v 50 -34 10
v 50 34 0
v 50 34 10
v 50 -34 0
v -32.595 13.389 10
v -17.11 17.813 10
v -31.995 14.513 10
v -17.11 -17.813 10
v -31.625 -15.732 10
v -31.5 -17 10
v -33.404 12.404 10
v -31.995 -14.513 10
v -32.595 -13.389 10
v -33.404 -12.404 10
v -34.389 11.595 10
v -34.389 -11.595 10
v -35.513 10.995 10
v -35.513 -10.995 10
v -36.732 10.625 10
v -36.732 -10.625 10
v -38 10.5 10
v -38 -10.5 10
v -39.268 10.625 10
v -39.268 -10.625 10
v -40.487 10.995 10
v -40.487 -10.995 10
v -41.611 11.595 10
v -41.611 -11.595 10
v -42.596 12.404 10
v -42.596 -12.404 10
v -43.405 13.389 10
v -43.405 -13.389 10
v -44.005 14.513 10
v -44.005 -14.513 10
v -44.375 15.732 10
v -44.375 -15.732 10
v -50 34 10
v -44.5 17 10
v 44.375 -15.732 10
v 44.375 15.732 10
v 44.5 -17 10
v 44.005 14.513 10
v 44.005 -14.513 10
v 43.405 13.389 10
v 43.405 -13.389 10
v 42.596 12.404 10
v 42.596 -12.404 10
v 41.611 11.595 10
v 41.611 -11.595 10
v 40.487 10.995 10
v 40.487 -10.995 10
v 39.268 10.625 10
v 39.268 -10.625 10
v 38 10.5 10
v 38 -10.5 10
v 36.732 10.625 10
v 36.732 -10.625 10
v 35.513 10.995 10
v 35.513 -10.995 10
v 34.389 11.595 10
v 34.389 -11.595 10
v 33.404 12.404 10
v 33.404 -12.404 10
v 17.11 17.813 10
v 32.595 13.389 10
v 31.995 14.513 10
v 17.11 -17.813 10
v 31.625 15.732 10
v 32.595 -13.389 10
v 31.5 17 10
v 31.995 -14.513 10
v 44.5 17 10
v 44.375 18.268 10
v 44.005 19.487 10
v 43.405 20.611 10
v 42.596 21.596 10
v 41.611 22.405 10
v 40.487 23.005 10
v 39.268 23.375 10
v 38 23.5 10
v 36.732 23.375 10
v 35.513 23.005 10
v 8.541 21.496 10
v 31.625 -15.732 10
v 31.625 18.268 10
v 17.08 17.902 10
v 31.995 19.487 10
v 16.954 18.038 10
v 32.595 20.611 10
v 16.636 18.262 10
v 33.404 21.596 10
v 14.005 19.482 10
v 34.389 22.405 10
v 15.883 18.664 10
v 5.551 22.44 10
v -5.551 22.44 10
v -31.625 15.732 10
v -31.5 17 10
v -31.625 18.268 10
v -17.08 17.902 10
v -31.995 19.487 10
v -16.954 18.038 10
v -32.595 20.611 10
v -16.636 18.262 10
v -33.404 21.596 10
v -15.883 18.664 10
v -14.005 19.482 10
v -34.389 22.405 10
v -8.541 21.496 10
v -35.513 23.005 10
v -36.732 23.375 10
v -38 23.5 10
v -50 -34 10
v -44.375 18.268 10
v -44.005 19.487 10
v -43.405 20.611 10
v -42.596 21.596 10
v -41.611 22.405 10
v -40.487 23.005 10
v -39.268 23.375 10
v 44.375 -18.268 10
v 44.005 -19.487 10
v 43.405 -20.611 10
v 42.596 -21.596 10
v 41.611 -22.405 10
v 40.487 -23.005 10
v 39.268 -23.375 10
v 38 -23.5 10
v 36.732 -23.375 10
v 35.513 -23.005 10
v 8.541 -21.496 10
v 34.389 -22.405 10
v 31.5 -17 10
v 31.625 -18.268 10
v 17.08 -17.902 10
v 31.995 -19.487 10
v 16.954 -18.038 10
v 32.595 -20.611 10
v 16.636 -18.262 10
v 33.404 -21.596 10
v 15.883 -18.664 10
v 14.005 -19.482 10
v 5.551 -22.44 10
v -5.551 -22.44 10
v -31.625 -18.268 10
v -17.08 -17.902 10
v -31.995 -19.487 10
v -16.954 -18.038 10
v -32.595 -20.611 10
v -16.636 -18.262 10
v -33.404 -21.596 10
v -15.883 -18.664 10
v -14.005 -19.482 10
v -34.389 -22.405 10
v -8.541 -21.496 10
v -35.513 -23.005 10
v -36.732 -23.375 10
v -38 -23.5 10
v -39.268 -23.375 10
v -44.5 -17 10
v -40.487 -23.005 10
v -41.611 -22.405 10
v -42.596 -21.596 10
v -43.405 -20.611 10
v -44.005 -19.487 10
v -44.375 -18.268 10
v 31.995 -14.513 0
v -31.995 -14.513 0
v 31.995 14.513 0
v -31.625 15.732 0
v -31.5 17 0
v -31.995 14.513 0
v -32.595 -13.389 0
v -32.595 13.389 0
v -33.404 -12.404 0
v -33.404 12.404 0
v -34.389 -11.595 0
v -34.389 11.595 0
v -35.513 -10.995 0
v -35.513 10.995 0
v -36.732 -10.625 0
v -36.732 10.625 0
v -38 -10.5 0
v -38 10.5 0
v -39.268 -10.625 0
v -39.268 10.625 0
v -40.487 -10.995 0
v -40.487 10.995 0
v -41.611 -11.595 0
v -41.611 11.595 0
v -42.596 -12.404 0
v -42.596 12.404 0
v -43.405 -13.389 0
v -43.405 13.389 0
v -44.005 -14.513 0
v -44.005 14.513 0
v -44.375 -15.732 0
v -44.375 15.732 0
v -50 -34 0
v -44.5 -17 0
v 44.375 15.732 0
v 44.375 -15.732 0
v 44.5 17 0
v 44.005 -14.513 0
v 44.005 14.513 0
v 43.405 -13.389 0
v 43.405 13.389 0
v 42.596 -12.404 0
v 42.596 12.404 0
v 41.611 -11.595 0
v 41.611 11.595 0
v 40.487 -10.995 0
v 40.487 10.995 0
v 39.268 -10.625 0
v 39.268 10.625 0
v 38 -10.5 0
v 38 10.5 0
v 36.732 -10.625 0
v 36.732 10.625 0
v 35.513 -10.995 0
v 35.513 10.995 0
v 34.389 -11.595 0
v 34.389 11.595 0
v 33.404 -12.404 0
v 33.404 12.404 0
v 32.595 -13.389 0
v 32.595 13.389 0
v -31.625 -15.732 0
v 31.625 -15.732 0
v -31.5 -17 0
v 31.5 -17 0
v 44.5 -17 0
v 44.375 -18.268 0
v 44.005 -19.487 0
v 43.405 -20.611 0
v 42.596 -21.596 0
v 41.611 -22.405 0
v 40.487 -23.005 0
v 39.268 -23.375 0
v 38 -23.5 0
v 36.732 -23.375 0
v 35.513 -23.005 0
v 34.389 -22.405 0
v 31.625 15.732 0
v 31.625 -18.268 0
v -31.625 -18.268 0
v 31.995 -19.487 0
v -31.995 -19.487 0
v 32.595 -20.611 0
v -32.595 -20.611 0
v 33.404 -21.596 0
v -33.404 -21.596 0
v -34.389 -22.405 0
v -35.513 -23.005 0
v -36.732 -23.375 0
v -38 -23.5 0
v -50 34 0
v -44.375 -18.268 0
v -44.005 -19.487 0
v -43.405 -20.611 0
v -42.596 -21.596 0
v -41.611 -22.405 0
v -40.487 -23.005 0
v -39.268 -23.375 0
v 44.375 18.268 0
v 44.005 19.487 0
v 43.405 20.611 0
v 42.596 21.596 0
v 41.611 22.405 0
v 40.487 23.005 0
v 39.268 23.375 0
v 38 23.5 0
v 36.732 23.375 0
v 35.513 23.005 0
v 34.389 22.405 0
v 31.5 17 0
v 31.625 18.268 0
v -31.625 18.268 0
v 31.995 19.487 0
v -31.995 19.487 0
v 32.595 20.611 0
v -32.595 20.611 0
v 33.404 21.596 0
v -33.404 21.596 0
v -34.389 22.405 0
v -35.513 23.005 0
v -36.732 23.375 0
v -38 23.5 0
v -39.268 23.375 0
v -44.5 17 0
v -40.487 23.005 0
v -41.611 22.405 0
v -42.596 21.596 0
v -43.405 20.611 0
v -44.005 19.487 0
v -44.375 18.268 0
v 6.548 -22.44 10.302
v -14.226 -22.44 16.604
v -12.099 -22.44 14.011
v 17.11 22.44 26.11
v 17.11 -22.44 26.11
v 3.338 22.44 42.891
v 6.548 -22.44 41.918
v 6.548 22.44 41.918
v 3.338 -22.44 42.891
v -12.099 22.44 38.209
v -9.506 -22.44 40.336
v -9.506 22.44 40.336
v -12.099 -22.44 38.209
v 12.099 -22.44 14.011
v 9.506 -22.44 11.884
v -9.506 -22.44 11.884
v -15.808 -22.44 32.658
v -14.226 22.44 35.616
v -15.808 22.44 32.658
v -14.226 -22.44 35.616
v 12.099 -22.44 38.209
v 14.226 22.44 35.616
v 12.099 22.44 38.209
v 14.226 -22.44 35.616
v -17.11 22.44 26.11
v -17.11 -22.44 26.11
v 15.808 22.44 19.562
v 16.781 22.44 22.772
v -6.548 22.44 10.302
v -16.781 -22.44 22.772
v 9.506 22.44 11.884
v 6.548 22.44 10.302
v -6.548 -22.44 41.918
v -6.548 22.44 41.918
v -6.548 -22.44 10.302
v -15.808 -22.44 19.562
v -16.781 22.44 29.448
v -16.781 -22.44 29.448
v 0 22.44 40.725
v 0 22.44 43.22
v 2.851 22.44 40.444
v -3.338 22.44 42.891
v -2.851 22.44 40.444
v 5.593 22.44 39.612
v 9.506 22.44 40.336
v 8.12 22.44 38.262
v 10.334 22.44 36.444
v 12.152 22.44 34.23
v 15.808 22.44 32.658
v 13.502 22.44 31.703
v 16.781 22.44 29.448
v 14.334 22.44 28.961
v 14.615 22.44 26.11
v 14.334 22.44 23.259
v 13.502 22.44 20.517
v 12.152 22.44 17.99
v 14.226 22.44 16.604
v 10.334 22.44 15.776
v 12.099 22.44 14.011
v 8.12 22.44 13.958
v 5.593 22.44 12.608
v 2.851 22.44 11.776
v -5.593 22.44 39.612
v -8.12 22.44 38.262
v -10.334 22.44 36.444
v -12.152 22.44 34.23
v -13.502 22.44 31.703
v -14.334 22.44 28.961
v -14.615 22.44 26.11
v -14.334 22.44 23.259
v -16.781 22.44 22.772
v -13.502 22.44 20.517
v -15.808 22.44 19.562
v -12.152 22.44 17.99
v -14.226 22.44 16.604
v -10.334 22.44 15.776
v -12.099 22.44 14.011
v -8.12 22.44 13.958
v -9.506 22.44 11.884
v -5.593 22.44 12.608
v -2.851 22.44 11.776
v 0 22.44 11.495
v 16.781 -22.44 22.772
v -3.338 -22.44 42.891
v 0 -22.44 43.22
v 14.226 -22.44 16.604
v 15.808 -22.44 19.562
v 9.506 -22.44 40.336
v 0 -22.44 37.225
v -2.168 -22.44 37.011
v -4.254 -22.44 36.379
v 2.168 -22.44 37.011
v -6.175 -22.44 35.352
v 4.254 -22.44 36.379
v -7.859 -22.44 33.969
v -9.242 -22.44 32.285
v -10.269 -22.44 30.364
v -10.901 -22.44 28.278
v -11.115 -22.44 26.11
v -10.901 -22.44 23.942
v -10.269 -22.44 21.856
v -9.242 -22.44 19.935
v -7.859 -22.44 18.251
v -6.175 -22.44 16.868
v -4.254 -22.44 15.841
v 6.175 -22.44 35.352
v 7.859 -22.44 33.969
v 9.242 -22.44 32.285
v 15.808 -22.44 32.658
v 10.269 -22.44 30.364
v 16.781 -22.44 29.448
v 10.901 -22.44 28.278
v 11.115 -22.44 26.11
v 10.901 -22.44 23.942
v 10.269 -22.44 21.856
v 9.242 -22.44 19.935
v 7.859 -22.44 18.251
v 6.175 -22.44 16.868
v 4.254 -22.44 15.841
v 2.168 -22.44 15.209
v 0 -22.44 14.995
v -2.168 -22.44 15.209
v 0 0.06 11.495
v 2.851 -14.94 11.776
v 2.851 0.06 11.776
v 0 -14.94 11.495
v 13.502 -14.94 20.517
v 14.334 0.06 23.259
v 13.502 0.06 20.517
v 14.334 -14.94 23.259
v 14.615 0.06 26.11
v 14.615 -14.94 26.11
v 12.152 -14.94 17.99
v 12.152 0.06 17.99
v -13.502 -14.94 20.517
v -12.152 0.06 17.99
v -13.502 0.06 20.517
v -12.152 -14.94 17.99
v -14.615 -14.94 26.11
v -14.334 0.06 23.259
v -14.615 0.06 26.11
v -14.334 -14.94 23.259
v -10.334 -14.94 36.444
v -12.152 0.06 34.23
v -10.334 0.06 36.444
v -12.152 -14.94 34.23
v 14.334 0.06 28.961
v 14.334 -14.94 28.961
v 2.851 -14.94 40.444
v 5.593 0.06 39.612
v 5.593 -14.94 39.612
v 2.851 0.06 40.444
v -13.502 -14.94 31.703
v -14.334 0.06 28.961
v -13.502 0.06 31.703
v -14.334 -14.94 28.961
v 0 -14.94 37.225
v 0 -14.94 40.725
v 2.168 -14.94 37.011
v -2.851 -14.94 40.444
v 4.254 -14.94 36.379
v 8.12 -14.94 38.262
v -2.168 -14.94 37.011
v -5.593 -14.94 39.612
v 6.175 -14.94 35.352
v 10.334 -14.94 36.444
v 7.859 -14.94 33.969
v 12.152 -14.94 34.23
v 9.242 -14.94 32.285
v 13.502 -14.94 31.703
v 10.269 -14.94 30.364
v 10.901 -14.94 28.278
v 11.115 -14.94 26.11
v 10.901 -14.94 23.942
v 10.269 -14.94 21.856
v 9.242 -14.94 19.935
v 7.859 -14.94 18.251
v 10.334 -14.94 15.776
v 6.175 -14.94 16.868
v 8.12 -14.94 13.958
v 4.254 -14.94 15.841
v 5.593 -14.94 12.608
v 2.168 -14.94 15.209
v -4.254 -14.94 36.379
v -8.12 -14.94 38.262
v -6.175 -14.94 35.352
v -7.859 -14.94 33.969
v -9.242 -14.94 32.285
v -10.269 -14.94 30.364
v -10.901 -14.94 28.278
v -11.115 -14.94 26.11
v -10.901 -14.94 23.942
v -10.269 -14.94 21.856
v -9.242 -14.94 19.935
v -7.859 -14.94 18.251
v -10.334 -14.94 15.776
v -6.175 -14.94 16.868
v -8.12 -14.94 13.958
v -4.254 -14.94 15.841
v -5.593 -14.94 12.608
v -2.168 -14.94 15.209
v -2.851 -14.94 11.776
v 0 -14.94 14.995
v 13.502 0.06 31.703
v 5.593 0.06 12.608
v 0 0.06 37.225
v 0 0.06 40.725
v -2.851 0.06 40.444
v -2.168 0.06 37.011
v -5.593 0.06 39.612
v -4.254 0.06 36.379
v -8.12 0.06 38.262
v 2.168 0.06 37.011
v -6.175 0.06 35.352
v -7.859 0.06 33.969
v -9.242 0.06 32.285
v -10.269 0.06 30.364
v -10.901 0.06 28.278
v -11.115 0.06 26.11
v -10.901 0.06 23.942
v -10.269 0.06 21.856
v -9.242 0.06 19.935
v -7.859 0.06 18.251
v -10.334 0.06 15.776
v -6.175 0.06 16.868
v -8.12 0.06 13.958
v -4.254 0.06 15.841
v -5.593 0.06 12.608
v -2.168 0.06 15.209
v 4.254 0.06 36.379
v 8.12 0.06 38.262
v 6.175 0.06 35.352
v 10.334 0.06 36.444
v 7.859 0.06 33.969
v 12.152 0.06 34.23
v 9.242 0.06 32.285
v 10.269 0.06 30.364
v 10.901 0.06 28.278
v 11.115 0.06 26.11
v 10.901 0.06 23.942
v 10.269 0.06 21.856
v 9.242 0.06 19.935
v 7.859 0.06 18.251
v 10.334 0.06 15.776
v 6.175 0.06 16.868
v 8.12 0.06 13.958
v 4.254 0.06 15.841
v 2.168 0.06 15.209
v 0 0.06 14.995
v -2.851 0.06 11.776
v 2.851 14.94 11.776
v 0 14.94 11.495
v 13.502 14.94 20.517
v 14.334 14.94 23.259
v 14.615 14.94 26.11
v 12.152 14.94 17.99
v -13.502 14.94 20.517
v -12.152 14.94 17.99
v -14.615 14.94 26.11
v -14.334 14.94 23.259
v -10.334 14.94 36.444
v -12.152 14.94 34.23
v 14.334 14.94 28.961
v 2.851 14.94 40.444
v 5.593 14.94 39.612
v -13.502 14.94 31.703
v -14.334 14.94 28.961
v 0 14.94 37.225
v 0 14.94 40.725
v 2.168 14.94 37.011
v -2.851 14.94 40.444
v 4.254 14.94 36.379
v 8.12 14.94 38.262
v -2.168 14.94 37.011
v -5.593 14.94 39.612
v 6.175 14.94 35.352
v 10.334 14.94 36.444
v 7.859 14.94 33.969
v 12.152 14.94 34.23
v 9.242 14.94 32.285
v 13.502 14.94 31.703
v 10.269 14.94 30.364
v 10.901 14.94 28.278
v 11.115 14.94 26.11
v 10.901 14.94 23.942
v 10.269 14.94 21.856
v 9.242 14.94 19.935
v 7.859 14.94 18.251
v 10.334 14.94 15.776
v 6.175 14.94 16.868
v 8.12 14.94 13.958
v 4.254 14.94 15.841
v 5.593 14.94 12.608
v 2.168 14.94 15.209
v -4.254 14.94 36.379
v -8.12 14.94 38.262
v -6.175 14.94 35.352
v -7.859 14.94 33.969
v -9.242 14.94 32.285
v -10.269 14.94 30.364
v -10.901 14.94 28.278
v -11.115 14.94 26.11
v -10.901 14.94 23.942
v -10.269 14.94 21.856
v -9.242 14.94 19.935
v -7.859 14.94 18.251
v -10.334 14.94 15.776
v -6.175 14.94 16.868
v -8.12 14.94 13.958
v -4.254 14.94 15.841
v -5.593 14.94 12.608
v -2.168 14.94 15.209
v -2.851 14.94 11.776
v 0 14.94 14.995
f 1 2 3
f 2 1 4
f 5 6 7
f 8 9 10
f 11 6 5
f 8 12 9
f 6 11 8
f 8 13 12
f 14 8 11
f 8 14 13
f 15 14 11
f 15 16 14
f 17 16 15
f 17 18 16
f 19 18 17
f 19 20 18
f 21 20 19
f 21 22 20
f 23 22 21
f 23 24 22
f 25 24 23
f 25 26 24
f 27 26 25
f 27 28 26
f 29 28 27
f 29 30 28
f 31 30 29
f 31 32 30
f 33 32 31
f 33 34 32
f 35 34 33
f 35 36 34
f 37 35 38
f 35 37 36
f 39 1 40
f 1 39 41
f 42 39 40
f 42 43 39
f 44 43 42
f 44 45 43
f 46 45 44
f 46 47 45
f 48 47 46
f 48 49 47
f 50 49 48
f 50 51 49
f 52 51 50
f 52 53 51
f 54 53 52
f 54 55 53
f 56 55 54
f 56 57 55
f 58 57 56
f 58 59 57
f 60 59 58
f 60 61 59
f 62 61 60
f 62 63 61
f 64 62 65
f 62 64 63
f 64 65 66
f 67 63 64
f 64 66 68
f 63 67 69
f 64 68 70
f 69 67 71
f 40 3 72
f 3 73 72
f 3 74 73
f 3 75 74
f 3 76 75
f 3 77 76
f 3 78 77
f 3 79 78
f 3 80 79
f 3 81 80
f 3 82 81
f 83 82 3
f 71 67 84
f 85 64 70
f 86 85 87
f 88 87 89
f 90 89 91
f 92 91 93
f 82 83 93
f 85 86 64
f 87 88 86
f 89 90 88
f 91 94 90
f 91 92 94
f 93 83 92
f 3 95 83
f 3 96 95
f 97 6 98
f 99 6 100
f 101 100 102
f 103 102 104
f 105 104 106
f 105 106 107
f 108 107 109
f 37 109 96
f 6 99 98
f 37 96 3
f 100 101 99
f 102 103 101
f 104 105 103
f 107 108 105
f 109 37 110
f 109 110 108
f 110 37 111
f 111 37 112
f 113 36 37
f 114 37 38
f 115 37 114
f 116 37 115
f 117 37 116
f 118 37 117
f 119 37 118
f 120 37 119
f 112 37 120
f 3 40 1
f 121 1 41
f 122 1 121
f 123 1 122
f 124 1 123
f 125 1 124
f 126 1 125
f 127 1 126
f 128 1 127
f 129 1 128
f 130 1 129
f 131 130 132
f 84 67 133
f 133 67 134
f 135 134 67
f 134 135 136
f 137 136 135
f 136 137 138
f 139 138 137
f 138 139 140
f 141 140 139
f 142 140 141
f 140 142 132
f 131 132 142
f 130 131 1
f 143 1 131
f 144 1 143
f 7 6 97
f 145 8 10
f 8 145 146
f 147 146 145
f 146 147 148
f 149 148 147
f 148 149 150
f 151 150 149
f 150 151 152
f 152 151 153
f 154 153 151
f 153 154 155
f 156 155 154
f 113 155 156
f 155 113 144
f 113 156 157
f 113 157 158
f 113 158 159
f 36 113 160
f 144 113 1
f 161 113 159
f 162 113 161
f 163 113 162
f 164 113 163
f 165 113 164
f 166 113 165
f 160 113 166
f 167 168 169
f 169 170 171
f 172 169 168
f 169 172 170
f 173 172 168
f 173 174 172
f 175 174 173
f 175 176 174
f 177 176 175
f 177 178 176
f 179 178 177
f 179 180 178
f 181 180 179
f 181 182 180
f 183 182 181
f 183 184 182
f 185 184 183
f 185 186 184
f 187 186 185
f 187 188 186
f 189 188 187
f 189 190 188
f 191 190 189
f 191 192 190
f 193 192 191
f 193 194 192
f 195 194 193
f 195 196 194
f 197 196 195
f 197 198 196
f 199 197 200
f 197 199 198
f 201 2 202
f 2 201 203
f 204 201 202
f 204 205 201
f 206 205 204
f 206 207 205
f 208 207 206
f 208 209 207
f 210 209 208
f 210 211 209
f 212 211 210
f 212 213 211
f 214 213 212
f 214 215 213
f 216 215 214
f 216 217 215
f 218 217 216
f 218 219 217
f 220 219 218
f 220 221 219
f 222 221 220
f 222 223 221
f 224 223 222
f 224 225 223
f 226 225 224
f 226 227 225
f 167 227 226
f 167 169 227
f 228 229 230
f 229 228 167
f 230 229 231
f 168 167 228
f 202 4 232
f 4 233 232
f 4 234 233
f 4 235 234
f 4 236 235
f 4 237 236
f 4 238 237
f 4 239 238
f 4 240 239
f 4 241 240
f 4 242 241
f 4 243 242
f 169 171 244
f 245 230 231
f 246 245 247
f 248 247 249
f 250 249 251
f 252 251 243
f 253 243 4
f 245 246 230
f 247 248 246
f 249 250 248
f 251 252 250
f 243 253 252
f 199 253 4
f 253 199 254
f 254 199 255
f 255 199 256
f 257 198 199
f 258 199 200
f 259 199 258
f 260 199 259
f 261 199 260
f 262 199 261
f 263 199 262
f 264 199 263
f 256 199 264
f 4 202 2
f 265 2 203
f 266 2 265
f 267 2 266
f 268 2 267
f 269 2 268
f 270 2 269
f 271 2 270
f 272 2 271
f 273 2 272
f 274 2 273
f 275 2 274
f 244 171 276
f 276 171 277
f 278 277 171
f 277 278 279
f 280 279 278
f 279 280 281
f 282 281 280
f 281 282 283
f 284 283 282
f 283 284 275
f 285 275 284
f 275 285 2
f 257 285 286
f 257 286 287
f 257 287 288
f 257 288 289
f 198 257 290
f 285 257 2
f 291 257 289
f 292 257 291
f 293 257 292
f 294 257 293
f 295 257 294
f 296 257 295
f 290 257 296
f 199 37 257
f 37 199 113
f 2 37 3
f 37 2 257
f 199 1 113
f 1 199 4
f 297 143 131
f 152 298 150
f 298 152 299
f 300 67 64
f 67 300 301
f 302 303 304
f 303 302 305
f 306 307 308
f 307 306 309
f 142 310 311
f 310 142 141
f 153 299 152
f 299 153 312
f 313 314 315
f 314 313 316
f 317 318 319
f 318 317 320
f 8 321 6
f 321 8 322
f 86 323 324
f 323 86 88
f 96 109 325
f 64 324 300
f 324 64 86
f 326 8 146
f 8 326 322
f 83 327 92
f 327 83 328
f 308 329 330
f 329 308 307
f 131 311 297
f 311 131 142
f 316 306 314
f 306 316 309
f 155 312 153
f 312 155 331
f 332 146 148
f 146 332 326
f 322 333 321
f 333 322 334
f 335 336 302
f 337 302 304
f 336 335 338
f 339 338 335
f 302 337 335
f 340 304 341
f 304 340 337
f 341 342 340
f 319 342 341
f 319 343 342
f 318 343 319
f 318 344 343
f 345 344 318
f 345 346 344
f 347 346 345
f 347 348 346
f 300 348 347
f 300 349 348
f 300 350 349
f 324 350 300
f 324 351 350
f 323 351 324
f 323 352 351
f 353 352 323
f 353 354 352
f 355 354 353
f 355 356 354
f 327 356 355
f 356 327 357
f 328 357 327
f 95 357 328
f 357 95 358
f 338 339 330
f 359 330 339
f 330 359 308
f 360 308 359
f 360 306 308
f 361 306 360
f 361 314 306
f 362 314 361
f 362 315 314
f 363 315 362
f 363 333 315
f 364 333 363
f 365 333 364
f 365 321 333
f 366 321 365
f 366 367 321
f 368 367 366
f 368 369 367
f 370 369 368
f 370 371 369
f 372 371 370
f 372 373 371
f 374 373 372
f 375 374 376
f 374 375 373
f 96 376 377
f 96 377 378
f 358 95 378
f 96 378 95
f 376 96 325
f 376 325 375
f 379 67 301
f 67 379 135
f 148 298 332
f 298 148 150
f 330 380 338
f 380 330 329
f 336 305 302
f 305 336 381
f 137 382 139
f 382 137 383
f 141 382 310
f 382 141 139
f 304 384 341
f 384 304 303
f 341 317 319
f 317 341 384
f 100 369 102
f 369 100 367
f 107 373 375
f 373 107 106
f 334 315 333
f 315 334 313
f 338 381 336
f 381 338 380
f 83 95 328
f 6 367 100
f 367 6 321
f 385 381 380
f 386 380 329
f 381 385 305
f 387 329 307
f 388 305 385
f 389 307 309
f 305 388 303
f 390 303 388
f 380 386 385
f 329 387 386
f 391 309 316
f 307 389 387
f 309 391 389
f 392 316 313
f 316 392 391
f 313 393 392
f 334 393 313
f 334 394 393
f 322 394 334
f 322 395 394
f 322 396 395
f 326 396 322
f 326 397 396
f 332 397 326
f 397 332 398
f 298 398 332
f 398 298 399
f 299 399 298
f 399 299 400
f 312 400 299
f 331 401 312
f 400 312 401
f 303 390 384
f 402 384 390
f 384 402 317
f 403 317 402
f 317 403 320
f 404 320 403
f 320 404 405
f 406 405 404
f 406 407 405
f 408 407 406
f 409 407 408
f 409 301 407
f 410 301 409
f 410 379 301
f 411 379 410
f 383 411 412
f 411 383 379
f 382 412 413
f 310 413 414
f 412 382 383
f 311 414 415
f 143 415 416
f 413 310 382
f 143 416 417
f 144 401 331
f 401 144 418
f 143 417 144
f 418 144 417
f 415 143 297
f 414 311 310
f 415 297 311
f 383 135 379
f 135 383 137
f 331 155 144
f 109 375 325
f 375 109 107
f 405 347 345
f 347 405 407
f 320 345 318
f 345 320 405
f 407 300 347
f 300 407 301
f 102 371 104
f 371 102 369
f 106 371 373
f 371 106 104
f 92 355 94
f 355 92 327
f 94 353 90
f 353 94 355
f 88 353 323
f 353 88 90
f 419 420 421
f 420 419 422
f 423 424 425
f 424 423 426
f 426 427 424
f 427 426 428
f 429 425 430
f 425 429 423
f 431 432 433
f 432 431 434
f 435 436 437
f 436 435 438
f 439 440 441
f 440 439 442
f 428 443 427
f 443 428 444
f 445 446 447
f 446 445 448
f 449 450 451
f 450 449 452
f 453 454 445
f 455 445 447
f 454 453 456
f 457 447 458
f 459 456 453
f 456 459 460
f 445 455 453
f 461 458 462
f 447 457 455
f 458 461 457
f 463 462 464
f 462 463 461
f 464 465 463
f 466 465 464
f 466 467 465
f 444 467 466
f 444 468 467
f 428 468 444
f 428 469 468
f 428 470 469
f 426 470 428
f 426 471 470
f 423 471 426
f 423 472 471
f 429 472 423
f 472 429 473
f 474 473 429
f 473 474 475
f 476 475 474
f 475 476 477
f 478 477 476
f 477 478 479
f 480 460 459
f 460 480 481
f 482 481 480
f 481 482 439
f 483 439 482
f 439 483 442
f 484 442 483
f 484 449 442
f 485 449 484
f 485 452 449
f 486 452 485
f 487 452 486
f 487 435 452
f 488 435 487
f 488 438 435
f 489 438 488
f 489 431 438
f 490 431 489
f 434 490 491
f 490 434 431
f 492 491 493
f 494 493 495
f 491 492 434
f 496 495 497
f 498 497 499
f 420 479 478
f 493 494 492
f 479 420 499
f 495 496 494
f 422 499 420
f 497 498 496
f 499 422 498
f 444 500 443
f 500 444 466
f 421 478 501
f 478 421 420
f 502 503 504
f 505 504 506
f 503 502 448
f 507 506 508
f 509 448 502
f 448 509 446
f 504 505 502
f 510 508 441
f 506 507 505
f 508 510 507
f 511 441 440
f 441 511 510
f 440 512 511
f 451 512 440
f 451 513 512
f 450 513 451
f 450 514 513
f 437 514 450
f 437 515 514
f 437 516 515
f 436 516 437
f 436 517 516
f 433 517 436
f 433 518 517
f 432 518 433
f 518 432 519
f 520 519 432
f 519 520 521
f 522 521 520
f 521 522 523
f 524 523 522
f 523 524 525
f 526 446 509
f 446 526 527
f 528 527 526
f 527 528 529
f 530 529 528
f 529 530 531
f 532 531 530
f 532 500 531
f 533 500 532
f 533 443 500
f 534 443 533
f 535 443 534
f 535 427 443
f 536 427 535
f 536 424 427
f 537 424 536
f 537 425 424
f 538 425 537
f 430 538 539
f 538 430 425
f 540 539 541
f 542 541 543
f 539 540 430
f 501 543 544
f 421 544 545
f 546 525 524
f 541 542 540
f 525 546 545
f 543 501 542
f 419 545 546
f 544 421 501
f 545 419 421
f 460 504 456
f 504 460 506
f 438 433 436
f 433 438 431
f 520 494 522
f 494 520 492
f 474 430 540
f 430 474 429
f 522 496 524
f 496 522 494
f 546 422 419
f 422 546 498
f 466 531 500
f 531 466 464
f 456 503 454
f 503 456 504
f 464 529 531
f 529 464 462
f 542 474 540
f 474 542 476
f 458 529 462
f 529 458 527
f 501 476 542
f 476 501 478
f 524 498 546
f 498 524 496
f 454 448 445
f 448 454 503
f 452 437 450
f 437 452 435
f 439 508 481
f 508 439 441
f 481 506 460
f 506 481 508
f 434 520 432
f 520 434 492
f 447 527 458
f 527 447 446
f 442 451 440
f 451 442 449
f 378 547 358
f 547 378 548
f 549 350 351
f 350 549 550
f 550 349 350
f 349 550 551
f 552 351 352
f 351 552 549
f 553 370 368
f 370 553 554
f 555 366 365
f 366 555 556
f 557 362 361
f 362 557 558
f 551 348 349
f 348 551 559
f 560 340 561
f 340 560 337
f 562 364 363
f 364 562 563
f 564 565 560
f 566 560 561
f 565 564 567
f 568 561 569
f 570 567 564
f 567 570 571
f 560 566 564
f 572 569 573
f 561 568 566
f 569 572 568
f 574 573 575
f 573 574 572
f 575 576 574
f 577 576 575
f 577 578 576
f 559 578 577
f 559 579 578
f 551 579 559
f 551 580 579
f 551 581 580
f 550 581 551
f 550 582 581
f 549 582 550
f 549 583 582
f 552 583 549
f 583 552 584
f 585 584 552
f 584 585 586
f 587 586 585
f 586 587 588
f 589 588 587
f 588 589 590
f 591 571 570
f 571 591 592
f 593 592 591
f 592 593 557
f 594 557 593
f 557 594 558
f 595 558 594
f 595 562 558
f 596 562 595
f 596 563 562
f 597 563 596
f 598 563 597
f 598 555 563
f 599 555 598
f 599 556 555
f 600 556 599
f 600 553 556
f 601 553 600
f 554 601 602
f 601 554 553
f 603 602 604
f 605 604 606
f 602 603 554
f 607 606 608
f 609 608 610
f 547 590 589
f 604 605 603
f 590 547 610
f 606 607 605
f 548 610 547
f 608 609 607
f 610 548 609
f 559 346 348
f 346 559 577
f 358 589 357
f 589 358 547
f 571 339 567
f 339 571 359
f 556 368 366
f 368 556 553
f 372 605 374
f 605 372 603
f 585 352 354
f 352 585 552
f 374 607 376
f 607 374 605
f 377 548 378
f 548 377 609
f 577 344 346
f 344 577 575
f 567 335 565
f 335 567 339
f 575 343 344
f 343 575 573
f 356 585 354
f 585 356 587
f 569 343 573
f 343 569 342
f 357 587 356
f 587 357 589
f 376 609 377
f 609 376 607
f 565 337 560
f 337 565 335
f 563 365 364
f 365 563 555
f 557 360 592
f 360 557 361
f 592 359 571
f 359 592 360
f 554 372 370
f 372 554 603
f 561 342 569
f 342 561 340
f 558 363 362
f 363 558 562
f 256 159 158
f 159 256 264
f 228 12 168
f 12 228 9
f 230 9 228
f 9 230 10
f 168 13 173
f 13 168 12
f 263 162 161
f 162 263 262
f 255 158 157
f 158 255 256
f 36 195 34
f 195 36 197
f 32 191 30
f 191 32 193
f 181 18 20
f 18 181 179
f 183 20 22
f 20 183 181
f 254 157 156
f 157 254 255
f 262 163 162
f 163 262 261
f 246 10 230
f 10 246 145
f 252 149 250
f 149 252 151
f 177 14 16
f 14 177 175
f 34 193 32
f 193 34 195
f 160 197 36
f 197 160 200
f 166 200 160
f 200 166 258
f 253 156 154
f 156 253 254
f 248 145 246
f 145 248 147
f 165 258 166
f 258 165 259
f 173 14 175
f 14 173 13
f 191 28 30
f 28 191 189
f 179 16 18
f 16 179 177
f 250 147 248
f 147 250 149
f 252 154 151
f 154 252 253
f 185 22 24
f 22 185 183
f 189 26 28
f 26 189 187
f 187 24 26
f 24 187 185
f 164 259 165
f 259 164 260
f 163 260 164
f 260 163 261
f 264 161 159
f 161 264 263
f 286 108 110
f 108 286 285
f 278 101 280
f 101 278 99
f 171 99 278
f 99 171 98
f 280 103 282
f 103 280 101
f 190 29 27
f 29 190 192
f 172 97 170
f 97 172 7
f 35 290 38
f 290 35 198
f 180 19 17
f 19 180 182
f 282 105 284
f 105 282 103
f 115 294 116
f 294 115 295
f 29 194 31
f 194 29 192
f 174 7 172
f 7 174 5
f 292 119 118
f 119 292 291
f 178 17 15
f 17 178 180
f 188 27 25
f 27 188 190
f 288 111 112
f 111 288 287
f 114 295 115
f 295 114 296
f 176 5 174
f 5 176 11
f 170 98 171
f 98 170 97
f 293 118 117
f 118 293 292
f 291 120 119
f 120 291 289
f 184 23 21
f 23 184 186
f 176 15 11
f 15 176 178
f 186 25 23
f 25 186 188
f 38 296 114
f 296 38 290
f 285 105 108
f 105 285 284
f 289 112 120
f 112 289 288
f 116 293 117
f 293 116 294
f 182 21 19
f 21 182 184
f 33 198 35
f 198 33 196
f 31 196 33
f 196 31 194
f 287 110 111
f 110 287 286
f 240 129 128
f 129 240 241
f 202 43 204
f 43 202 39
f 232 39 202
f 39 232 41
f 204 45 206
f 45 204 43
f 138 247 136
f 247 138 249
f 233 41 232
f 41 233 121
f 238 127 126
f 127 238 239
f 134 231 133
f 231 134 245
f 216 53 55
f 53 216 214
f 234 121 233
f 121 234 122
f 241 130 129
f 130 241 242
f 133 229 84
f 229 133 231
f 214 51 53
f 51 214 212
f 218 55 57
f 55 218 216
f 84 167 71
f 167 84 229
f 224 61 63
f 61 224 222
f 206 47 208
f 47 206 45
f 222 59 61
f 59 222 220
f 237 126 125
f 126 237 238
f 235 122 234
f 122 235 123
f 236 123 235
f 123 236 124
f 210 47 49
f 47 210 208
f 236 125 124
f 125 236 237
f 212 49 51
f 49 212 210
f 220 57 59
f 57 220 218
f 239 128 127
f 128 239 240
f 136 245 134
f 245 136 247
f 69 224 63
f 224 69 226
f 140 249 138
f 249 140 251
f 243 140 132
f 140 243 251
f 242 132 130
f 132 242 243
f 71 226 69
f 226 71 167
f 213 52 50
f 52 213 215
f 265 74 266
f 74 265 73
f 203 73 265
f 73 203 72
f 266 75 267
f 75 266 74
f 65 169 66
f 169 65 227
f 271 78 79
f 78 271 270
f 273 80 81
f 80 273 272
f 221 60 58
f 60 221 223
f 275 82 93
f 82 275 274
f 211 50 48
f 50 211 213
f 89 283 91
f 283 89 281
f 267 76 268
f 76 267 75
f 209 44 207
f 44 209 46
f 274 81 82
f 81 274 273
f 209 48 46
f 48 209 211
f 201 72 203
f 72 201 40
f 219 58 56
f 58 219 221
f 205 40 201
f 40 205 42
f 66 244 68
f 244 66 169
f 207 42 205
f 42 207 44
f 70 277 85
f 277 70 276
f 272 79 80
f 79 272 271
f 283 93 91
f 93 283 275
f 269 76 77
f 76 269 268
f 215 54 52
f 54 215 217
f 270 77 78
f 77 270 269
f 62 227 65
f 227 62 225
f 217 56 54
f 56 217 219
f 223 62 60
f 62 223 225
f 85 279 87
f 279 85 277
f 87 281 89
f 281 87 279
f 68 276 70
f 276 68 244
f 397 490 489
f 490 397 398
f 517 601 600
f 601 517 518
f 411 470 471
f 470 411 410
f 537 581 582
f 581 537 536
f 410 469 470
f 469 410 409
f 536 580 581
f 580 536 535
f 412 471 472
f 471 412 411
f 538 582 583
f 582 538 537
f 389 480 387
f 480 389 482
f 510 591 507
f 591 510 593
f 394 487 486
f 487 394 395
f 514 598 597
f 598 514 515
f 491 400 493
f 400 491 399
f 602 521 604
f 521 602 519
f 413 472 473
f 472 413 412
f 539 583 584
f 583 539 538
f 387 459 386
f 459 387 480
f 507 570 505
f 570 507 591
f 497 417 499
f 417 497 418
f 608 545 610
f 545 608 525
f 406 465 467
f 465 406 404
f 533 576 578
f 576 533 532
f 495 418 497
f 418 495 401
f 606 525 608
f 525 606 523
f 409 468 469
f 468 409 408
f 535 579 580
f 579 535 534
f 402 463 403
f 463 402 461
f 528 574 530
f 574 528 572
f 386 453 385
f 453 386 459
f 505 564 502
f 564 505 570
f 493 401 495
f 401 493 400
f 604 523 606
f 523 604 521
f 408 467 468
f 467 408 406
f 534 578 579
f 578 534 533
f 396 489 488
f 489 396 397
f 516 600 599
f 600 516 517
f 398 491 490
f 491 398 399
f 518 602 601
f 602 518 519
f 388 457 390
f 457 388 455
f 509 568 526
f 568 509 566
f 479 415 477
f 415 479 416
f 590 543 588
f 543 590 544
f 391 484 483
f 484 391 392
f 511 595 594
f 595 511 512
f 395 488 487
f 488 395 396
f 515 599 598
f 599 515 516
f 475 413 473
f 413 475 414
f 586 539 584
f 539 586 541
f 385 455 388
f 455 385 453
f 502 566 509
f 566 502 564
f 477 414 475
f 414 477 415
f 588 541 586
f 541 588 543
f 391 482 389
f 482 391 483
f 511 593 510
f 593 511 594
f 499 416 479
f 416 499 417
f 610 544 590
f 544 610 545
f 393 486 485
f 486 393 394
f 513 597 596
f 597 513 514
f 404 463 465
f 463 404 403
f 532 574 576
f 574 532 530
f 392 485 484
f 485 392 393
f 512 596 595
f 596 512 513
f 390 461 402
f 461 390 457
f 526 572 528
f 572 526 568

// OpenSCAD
$fn = 32;

// ----------------------------------------------------------------------
// Bearing block: 100 x 68 mm base, 22.23 mm bore at 26.11 mm
// ----------------------------------------------------------------------

// --- parameters (mm) ---
base_w = 100;             // base width
base_d = 68;              // base depth
base_t = 10;              // base thickness
bore_d = 22.23;           // shaft / bearing bore
house_r = 17.11;          // housing outer radius
house_len = 44.88;        // housing length along the shaft
foot_w = 34.22;           // foot width under the housing
foot_len = 34.88;         // foot length along the shaft
axis_z = 26.11;           // bore axis height above the base
holes_d = 13;             // mounting holes
hole_x = 38;              // mounting hole spacing
seat_d = 10;              // bearing seat depth
seat_wall = 3.5;          // seat wall thickness

difference() {
  union() {
    /* base plate with its underside on z = 0 */
    translate([0, 0, base_t / 2]) cube([base_w, base_d, base_t], center = true);
    /* hull foot: a straight web blending into the round housing */
    hull() {
      translate([0, 0, base_t - 0.5]) cube([foot_w, foot_len, 1.6], center = true);
      translate([0, 0, axis_z]) rotate([-90, 0, 0]) cylinder(h = house_len, d = 2 * house_r, center = true);
    }
  }
  /* bore through the housing, 2.5 mm clear on both sides */
  translate([0, 0, axis_z]) rotate([-90, 0, 0]) cylinder(h = house_len + 5, d = bore_d, center = true);
  /* bearing seats, recessed into both ends of the housing */
  for (sy = [-1, 1]) {
    translate([0, sy * (house_len / 2 - seat_d + 2.5), axis_z]) rotate([-90, 0, 0]) cylinder(h = seat_d + 5, d = bore_d + 2 * seat_wall);
  }
  /* mounting holes through the base plate */
  for (hx = [-38, 38]) {
    for (hy = [-17, 17]) {
      translate([hx, hy, -2.5]) cylinder(h = base_t + 5, d = holes_d);
    }
  }
}
